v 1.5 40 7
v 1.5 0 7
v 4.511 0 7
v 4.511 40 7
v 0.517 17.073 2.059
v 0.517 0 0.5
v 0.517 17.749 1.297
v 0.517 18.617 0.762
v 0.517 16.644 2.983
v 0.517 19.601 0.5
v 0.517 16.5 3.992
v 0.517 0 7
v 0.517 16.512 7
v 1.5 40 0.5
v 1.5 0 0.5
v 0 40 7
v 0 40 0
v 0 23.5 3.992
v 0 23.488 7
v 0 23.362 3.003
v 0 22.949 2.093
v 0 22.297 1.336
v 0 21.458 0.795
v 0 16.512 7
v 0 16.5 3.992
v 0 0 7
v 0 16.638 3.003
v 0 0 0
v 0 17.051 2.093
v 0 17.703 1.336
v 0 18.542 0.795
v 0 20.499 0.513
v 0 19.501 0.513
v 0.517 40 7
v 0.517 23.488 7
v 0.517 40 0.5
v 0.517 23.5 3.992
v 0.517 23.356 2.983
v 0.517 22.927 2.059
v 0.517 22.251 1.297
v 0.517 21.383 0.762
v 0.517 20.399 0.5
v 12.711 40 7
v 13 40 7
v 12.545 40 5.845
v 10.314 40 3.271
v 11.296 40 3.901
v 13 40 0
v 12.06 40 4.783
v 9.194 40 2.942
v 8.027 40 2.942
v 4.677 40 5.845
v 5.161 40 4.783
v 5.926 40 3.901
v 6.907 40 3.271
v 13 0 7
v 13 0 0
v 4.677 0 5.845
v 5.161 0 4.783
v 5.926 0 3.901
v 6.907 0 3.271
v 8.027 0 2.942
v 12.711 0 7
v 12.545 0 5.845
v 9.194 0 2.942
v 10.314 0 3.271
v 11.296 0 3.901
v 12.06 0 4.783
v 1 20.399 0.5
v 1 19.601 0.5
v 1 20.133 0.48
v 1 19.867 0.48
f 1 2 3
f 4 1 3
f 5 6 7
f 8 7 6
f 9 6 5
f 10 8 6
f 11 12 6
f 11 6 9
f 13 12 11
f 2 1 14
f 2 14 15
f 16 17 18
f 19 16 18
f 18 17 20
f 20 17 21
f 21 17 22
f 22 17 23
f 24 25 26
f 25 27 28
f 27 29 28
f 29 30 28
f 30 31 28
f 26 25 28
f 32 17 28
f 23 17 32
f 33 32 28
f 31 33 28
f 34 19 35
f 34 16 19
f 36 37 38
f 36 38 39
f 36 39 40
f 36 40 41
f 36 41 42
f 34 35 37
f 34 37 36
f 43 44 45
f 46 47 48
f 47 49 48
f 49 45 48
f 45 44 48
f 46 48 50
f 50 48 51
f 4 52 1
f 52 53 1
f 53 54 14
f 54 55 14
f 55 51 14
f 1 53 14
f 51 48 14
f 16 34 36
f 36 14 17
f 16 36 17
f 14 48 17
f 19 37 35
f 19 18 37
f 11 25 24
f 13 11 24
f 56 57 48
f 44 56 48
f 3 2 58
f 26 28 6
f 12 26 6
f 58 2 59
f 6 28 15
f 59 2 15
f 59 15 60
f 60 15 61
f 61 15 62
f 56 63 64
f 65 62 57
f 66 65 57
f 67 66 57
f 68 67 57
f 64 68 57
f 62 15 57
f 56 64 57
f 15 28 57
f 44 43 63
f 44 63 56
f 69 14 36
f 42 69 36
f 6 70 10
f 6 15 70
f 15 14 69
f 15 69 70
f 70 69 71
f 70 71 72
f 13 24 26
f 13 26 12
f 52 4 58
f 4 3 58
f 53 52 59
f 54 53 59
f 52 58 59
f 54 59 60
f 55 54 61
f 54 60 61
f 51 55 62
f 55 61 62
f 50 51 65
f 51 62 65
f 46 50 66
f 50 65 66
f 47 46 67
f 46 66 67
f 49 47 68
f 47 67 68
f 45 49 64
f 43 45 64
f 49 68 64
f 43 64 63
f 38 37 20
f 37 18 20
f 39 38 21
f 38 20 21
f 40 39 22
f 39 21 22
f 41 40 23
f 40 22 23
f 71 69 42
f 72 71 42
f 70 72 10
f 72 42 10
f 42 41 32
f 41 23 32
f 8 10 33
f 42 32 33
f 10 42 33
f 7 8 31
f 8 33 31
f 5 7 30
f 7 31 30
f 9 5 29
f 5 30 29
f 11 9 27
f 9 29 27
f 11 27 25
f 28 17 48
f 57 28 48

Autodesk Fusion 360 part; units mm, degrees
sketch "Sketch1" plane through (0, 0, 0) normal (0, 0, 1) x (1, 0, 0)
  line L0 (0, 0) -> (13, 0)
  line L1 (13, 0) -> (13, 40)
  line L2 (13, 40) -> (0, 40)
  line L3 (0, 40) -> (0, 0)
  dimension "d1" = 13
  dimension "d2" = 40
extrude "Extrude1" add sketch "Sketch1" along normal blind 7 and the other way blind 0
sketch "Sketch2" plane through (0, 0, 0) normal (0, -1, 0) x (1, 0, 0)
  line L0 (0, 0) -> (13, 0)
  line L1 (13, 0) -> (13, 7)
  line L2 (13, 7) -> (0, 7)
  line L3 (0, 7) -> (0, 0)
  circle A0 centre (8.6106, 7) radius 4.1
  dimension "d5" = 8.2
extrude "Extrude2" cut sketch "Sketch2" against normal blind 41 contours L2 A0 picked at (8.104, 4.6437)
sketch "Sketch4" plane through (0, 0, 7) normal (0, 0, 1) x (-1, 0, 0)
  line L0 (-4.5106, 0) -> (-4.5106, -40)
  line L1 (-4.5106, -40) -> (0, -40)
  line L2 (0, -40) -> (0, 0)
  line L3 (0, 0) -> (-4.5106, 0)
  line L4 (-0.517, -40) -> (-1.5, -40)
  line L5 (-1.5, -40) -> (-1.5, 0)
  line L6 (-1.5, 0) -> (-0.517, 0)
  line L7 (-0.517, 0) -> (-0.517, -40)
extrude "Extrude4" cut sketch "Sketch4" against normal blind 6.5 contours L1 L3 L4 L5 L6 L7
sketch "Sketch5" plane through (0, 0, 0) normal (-1, 0, 0) x (0, -1, 0)
  line L0 (-40, 0) -> (0, 0)
  line L1 (0, 0) -> (0, 7)
  line L2 (0, 7) -> (-40, 7)
  line L3 (-40, 7) -> (-40, 0)
  circle A0 centre (-20, 3.9772) radius 3.5
  line L4 (-23.5, 3.9917) -> (-23.4875, 7)
  line L5 (-16.5, 3.9917) -> (-16.5125, 7)
  dimension "d15" = 7
extrude "Extrude5" cut sketch "Sketch5" against normal blind 1 contours L2 A0 L4 | L2 A0 L5 | L2 A0 picked at (-20.0897, 4.8292)
